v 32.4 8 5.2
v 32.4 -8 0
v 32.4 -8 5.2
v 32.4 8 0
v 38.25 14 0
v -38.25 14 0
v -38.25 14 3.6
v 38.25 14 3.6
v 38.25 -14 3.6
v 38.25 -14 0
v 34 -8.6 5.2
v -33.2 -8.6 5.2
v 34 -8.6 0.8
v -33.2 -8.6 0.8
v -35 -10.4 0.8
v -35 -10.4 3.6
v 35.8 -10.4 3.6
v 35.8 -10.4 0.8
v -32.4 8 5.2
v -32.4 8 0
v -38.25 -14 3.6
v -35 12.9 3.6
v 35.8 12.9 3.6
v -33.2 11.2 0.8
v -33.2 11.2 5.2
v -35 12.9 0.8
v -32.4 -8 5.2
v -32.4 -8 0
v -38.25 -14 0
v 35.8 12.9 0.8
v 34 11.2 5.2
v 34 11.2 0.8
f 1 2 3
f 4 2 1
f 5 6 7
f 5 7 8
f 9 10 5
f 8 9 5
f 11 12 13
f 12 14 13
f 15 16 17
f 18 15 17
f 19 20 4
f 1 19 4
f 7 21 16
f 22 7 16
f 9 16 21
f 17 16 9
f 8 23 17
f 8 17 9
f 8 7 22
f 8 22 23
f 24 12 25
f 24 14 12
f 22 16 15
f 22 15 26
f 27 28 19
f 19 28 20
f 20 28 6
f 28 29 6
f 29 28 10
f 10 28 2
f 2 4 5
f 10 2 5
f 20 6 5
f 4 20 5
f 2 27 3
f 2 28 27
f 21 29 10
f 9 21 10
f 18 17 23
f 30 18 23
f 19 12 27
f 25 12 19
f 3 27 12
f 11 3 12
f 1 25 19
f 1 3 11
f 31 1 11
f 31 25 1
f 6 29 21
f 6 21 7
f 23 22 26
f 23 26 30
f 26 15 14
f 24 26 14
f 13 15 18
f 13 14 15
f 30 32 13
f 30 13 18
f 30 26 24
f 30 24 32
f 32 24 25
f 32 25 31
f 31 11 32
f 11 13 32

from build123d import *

# Parameters (mm, degrees)
F0_W     = 76.5
F0_H     = 28
F1_DEPTH = 3.6
F2_W     = 64.8
F2_H     = 16
F3_DEPTH = 25
F4_W     = 70.8
F4_H     = 23.3
F4_W_2   = 67.2
F4_H_2   = 19.8
F5_DEPTH = 2.8
F6_W     = 67.2
F6_H     = 19.8
F6_W_2   = 64.8
F6_H_2   = 16
F7_DEPTH = 1.6


with BuildPart() as f1:
    # F0 (on Top) → F1 (new body)
    with BuildSketch(Plane.XY):
        Rectangle(F0_W, F0_H)
    extrude(amount=F1_DEPTH)

    # F2 (on face) → F3 (cut)
    with BuildSketch(Plane.XY.offset(3.6)):
        Rectangle(F2_W, F2_H)
    extrude(amount=-F3_DEPTH, mode=Mode.SUBTRACT)

    # F4 (on face) → F5 (cut)
    with BuildSketch(Plane.XY.offset(3.6)):
        with Locations((0.4, 1.25)):
            Rectangle(F4_W, F4_H)
        with Locations((0.4, 1.3)):
            Rectangle(F4_W_2, F4_H_2, mode=Mode.SUBTRACT)
    extrude(amount=-F5_DEPTH, mode=Mode.SUBTRACT)

    # F6 (on face) → F7 (join)
    with BuildSketch(Plane.XY.offset(3.6)):
        with Locations((0.4, 1.3)):
            Rectangle(F6_W, F6_H)
        Rectangle(F6_W_2, F6_H_2, mode=Mode.SUBTRACT)
    extrude(amount=F7_DEPTH)


solid = f1.part
